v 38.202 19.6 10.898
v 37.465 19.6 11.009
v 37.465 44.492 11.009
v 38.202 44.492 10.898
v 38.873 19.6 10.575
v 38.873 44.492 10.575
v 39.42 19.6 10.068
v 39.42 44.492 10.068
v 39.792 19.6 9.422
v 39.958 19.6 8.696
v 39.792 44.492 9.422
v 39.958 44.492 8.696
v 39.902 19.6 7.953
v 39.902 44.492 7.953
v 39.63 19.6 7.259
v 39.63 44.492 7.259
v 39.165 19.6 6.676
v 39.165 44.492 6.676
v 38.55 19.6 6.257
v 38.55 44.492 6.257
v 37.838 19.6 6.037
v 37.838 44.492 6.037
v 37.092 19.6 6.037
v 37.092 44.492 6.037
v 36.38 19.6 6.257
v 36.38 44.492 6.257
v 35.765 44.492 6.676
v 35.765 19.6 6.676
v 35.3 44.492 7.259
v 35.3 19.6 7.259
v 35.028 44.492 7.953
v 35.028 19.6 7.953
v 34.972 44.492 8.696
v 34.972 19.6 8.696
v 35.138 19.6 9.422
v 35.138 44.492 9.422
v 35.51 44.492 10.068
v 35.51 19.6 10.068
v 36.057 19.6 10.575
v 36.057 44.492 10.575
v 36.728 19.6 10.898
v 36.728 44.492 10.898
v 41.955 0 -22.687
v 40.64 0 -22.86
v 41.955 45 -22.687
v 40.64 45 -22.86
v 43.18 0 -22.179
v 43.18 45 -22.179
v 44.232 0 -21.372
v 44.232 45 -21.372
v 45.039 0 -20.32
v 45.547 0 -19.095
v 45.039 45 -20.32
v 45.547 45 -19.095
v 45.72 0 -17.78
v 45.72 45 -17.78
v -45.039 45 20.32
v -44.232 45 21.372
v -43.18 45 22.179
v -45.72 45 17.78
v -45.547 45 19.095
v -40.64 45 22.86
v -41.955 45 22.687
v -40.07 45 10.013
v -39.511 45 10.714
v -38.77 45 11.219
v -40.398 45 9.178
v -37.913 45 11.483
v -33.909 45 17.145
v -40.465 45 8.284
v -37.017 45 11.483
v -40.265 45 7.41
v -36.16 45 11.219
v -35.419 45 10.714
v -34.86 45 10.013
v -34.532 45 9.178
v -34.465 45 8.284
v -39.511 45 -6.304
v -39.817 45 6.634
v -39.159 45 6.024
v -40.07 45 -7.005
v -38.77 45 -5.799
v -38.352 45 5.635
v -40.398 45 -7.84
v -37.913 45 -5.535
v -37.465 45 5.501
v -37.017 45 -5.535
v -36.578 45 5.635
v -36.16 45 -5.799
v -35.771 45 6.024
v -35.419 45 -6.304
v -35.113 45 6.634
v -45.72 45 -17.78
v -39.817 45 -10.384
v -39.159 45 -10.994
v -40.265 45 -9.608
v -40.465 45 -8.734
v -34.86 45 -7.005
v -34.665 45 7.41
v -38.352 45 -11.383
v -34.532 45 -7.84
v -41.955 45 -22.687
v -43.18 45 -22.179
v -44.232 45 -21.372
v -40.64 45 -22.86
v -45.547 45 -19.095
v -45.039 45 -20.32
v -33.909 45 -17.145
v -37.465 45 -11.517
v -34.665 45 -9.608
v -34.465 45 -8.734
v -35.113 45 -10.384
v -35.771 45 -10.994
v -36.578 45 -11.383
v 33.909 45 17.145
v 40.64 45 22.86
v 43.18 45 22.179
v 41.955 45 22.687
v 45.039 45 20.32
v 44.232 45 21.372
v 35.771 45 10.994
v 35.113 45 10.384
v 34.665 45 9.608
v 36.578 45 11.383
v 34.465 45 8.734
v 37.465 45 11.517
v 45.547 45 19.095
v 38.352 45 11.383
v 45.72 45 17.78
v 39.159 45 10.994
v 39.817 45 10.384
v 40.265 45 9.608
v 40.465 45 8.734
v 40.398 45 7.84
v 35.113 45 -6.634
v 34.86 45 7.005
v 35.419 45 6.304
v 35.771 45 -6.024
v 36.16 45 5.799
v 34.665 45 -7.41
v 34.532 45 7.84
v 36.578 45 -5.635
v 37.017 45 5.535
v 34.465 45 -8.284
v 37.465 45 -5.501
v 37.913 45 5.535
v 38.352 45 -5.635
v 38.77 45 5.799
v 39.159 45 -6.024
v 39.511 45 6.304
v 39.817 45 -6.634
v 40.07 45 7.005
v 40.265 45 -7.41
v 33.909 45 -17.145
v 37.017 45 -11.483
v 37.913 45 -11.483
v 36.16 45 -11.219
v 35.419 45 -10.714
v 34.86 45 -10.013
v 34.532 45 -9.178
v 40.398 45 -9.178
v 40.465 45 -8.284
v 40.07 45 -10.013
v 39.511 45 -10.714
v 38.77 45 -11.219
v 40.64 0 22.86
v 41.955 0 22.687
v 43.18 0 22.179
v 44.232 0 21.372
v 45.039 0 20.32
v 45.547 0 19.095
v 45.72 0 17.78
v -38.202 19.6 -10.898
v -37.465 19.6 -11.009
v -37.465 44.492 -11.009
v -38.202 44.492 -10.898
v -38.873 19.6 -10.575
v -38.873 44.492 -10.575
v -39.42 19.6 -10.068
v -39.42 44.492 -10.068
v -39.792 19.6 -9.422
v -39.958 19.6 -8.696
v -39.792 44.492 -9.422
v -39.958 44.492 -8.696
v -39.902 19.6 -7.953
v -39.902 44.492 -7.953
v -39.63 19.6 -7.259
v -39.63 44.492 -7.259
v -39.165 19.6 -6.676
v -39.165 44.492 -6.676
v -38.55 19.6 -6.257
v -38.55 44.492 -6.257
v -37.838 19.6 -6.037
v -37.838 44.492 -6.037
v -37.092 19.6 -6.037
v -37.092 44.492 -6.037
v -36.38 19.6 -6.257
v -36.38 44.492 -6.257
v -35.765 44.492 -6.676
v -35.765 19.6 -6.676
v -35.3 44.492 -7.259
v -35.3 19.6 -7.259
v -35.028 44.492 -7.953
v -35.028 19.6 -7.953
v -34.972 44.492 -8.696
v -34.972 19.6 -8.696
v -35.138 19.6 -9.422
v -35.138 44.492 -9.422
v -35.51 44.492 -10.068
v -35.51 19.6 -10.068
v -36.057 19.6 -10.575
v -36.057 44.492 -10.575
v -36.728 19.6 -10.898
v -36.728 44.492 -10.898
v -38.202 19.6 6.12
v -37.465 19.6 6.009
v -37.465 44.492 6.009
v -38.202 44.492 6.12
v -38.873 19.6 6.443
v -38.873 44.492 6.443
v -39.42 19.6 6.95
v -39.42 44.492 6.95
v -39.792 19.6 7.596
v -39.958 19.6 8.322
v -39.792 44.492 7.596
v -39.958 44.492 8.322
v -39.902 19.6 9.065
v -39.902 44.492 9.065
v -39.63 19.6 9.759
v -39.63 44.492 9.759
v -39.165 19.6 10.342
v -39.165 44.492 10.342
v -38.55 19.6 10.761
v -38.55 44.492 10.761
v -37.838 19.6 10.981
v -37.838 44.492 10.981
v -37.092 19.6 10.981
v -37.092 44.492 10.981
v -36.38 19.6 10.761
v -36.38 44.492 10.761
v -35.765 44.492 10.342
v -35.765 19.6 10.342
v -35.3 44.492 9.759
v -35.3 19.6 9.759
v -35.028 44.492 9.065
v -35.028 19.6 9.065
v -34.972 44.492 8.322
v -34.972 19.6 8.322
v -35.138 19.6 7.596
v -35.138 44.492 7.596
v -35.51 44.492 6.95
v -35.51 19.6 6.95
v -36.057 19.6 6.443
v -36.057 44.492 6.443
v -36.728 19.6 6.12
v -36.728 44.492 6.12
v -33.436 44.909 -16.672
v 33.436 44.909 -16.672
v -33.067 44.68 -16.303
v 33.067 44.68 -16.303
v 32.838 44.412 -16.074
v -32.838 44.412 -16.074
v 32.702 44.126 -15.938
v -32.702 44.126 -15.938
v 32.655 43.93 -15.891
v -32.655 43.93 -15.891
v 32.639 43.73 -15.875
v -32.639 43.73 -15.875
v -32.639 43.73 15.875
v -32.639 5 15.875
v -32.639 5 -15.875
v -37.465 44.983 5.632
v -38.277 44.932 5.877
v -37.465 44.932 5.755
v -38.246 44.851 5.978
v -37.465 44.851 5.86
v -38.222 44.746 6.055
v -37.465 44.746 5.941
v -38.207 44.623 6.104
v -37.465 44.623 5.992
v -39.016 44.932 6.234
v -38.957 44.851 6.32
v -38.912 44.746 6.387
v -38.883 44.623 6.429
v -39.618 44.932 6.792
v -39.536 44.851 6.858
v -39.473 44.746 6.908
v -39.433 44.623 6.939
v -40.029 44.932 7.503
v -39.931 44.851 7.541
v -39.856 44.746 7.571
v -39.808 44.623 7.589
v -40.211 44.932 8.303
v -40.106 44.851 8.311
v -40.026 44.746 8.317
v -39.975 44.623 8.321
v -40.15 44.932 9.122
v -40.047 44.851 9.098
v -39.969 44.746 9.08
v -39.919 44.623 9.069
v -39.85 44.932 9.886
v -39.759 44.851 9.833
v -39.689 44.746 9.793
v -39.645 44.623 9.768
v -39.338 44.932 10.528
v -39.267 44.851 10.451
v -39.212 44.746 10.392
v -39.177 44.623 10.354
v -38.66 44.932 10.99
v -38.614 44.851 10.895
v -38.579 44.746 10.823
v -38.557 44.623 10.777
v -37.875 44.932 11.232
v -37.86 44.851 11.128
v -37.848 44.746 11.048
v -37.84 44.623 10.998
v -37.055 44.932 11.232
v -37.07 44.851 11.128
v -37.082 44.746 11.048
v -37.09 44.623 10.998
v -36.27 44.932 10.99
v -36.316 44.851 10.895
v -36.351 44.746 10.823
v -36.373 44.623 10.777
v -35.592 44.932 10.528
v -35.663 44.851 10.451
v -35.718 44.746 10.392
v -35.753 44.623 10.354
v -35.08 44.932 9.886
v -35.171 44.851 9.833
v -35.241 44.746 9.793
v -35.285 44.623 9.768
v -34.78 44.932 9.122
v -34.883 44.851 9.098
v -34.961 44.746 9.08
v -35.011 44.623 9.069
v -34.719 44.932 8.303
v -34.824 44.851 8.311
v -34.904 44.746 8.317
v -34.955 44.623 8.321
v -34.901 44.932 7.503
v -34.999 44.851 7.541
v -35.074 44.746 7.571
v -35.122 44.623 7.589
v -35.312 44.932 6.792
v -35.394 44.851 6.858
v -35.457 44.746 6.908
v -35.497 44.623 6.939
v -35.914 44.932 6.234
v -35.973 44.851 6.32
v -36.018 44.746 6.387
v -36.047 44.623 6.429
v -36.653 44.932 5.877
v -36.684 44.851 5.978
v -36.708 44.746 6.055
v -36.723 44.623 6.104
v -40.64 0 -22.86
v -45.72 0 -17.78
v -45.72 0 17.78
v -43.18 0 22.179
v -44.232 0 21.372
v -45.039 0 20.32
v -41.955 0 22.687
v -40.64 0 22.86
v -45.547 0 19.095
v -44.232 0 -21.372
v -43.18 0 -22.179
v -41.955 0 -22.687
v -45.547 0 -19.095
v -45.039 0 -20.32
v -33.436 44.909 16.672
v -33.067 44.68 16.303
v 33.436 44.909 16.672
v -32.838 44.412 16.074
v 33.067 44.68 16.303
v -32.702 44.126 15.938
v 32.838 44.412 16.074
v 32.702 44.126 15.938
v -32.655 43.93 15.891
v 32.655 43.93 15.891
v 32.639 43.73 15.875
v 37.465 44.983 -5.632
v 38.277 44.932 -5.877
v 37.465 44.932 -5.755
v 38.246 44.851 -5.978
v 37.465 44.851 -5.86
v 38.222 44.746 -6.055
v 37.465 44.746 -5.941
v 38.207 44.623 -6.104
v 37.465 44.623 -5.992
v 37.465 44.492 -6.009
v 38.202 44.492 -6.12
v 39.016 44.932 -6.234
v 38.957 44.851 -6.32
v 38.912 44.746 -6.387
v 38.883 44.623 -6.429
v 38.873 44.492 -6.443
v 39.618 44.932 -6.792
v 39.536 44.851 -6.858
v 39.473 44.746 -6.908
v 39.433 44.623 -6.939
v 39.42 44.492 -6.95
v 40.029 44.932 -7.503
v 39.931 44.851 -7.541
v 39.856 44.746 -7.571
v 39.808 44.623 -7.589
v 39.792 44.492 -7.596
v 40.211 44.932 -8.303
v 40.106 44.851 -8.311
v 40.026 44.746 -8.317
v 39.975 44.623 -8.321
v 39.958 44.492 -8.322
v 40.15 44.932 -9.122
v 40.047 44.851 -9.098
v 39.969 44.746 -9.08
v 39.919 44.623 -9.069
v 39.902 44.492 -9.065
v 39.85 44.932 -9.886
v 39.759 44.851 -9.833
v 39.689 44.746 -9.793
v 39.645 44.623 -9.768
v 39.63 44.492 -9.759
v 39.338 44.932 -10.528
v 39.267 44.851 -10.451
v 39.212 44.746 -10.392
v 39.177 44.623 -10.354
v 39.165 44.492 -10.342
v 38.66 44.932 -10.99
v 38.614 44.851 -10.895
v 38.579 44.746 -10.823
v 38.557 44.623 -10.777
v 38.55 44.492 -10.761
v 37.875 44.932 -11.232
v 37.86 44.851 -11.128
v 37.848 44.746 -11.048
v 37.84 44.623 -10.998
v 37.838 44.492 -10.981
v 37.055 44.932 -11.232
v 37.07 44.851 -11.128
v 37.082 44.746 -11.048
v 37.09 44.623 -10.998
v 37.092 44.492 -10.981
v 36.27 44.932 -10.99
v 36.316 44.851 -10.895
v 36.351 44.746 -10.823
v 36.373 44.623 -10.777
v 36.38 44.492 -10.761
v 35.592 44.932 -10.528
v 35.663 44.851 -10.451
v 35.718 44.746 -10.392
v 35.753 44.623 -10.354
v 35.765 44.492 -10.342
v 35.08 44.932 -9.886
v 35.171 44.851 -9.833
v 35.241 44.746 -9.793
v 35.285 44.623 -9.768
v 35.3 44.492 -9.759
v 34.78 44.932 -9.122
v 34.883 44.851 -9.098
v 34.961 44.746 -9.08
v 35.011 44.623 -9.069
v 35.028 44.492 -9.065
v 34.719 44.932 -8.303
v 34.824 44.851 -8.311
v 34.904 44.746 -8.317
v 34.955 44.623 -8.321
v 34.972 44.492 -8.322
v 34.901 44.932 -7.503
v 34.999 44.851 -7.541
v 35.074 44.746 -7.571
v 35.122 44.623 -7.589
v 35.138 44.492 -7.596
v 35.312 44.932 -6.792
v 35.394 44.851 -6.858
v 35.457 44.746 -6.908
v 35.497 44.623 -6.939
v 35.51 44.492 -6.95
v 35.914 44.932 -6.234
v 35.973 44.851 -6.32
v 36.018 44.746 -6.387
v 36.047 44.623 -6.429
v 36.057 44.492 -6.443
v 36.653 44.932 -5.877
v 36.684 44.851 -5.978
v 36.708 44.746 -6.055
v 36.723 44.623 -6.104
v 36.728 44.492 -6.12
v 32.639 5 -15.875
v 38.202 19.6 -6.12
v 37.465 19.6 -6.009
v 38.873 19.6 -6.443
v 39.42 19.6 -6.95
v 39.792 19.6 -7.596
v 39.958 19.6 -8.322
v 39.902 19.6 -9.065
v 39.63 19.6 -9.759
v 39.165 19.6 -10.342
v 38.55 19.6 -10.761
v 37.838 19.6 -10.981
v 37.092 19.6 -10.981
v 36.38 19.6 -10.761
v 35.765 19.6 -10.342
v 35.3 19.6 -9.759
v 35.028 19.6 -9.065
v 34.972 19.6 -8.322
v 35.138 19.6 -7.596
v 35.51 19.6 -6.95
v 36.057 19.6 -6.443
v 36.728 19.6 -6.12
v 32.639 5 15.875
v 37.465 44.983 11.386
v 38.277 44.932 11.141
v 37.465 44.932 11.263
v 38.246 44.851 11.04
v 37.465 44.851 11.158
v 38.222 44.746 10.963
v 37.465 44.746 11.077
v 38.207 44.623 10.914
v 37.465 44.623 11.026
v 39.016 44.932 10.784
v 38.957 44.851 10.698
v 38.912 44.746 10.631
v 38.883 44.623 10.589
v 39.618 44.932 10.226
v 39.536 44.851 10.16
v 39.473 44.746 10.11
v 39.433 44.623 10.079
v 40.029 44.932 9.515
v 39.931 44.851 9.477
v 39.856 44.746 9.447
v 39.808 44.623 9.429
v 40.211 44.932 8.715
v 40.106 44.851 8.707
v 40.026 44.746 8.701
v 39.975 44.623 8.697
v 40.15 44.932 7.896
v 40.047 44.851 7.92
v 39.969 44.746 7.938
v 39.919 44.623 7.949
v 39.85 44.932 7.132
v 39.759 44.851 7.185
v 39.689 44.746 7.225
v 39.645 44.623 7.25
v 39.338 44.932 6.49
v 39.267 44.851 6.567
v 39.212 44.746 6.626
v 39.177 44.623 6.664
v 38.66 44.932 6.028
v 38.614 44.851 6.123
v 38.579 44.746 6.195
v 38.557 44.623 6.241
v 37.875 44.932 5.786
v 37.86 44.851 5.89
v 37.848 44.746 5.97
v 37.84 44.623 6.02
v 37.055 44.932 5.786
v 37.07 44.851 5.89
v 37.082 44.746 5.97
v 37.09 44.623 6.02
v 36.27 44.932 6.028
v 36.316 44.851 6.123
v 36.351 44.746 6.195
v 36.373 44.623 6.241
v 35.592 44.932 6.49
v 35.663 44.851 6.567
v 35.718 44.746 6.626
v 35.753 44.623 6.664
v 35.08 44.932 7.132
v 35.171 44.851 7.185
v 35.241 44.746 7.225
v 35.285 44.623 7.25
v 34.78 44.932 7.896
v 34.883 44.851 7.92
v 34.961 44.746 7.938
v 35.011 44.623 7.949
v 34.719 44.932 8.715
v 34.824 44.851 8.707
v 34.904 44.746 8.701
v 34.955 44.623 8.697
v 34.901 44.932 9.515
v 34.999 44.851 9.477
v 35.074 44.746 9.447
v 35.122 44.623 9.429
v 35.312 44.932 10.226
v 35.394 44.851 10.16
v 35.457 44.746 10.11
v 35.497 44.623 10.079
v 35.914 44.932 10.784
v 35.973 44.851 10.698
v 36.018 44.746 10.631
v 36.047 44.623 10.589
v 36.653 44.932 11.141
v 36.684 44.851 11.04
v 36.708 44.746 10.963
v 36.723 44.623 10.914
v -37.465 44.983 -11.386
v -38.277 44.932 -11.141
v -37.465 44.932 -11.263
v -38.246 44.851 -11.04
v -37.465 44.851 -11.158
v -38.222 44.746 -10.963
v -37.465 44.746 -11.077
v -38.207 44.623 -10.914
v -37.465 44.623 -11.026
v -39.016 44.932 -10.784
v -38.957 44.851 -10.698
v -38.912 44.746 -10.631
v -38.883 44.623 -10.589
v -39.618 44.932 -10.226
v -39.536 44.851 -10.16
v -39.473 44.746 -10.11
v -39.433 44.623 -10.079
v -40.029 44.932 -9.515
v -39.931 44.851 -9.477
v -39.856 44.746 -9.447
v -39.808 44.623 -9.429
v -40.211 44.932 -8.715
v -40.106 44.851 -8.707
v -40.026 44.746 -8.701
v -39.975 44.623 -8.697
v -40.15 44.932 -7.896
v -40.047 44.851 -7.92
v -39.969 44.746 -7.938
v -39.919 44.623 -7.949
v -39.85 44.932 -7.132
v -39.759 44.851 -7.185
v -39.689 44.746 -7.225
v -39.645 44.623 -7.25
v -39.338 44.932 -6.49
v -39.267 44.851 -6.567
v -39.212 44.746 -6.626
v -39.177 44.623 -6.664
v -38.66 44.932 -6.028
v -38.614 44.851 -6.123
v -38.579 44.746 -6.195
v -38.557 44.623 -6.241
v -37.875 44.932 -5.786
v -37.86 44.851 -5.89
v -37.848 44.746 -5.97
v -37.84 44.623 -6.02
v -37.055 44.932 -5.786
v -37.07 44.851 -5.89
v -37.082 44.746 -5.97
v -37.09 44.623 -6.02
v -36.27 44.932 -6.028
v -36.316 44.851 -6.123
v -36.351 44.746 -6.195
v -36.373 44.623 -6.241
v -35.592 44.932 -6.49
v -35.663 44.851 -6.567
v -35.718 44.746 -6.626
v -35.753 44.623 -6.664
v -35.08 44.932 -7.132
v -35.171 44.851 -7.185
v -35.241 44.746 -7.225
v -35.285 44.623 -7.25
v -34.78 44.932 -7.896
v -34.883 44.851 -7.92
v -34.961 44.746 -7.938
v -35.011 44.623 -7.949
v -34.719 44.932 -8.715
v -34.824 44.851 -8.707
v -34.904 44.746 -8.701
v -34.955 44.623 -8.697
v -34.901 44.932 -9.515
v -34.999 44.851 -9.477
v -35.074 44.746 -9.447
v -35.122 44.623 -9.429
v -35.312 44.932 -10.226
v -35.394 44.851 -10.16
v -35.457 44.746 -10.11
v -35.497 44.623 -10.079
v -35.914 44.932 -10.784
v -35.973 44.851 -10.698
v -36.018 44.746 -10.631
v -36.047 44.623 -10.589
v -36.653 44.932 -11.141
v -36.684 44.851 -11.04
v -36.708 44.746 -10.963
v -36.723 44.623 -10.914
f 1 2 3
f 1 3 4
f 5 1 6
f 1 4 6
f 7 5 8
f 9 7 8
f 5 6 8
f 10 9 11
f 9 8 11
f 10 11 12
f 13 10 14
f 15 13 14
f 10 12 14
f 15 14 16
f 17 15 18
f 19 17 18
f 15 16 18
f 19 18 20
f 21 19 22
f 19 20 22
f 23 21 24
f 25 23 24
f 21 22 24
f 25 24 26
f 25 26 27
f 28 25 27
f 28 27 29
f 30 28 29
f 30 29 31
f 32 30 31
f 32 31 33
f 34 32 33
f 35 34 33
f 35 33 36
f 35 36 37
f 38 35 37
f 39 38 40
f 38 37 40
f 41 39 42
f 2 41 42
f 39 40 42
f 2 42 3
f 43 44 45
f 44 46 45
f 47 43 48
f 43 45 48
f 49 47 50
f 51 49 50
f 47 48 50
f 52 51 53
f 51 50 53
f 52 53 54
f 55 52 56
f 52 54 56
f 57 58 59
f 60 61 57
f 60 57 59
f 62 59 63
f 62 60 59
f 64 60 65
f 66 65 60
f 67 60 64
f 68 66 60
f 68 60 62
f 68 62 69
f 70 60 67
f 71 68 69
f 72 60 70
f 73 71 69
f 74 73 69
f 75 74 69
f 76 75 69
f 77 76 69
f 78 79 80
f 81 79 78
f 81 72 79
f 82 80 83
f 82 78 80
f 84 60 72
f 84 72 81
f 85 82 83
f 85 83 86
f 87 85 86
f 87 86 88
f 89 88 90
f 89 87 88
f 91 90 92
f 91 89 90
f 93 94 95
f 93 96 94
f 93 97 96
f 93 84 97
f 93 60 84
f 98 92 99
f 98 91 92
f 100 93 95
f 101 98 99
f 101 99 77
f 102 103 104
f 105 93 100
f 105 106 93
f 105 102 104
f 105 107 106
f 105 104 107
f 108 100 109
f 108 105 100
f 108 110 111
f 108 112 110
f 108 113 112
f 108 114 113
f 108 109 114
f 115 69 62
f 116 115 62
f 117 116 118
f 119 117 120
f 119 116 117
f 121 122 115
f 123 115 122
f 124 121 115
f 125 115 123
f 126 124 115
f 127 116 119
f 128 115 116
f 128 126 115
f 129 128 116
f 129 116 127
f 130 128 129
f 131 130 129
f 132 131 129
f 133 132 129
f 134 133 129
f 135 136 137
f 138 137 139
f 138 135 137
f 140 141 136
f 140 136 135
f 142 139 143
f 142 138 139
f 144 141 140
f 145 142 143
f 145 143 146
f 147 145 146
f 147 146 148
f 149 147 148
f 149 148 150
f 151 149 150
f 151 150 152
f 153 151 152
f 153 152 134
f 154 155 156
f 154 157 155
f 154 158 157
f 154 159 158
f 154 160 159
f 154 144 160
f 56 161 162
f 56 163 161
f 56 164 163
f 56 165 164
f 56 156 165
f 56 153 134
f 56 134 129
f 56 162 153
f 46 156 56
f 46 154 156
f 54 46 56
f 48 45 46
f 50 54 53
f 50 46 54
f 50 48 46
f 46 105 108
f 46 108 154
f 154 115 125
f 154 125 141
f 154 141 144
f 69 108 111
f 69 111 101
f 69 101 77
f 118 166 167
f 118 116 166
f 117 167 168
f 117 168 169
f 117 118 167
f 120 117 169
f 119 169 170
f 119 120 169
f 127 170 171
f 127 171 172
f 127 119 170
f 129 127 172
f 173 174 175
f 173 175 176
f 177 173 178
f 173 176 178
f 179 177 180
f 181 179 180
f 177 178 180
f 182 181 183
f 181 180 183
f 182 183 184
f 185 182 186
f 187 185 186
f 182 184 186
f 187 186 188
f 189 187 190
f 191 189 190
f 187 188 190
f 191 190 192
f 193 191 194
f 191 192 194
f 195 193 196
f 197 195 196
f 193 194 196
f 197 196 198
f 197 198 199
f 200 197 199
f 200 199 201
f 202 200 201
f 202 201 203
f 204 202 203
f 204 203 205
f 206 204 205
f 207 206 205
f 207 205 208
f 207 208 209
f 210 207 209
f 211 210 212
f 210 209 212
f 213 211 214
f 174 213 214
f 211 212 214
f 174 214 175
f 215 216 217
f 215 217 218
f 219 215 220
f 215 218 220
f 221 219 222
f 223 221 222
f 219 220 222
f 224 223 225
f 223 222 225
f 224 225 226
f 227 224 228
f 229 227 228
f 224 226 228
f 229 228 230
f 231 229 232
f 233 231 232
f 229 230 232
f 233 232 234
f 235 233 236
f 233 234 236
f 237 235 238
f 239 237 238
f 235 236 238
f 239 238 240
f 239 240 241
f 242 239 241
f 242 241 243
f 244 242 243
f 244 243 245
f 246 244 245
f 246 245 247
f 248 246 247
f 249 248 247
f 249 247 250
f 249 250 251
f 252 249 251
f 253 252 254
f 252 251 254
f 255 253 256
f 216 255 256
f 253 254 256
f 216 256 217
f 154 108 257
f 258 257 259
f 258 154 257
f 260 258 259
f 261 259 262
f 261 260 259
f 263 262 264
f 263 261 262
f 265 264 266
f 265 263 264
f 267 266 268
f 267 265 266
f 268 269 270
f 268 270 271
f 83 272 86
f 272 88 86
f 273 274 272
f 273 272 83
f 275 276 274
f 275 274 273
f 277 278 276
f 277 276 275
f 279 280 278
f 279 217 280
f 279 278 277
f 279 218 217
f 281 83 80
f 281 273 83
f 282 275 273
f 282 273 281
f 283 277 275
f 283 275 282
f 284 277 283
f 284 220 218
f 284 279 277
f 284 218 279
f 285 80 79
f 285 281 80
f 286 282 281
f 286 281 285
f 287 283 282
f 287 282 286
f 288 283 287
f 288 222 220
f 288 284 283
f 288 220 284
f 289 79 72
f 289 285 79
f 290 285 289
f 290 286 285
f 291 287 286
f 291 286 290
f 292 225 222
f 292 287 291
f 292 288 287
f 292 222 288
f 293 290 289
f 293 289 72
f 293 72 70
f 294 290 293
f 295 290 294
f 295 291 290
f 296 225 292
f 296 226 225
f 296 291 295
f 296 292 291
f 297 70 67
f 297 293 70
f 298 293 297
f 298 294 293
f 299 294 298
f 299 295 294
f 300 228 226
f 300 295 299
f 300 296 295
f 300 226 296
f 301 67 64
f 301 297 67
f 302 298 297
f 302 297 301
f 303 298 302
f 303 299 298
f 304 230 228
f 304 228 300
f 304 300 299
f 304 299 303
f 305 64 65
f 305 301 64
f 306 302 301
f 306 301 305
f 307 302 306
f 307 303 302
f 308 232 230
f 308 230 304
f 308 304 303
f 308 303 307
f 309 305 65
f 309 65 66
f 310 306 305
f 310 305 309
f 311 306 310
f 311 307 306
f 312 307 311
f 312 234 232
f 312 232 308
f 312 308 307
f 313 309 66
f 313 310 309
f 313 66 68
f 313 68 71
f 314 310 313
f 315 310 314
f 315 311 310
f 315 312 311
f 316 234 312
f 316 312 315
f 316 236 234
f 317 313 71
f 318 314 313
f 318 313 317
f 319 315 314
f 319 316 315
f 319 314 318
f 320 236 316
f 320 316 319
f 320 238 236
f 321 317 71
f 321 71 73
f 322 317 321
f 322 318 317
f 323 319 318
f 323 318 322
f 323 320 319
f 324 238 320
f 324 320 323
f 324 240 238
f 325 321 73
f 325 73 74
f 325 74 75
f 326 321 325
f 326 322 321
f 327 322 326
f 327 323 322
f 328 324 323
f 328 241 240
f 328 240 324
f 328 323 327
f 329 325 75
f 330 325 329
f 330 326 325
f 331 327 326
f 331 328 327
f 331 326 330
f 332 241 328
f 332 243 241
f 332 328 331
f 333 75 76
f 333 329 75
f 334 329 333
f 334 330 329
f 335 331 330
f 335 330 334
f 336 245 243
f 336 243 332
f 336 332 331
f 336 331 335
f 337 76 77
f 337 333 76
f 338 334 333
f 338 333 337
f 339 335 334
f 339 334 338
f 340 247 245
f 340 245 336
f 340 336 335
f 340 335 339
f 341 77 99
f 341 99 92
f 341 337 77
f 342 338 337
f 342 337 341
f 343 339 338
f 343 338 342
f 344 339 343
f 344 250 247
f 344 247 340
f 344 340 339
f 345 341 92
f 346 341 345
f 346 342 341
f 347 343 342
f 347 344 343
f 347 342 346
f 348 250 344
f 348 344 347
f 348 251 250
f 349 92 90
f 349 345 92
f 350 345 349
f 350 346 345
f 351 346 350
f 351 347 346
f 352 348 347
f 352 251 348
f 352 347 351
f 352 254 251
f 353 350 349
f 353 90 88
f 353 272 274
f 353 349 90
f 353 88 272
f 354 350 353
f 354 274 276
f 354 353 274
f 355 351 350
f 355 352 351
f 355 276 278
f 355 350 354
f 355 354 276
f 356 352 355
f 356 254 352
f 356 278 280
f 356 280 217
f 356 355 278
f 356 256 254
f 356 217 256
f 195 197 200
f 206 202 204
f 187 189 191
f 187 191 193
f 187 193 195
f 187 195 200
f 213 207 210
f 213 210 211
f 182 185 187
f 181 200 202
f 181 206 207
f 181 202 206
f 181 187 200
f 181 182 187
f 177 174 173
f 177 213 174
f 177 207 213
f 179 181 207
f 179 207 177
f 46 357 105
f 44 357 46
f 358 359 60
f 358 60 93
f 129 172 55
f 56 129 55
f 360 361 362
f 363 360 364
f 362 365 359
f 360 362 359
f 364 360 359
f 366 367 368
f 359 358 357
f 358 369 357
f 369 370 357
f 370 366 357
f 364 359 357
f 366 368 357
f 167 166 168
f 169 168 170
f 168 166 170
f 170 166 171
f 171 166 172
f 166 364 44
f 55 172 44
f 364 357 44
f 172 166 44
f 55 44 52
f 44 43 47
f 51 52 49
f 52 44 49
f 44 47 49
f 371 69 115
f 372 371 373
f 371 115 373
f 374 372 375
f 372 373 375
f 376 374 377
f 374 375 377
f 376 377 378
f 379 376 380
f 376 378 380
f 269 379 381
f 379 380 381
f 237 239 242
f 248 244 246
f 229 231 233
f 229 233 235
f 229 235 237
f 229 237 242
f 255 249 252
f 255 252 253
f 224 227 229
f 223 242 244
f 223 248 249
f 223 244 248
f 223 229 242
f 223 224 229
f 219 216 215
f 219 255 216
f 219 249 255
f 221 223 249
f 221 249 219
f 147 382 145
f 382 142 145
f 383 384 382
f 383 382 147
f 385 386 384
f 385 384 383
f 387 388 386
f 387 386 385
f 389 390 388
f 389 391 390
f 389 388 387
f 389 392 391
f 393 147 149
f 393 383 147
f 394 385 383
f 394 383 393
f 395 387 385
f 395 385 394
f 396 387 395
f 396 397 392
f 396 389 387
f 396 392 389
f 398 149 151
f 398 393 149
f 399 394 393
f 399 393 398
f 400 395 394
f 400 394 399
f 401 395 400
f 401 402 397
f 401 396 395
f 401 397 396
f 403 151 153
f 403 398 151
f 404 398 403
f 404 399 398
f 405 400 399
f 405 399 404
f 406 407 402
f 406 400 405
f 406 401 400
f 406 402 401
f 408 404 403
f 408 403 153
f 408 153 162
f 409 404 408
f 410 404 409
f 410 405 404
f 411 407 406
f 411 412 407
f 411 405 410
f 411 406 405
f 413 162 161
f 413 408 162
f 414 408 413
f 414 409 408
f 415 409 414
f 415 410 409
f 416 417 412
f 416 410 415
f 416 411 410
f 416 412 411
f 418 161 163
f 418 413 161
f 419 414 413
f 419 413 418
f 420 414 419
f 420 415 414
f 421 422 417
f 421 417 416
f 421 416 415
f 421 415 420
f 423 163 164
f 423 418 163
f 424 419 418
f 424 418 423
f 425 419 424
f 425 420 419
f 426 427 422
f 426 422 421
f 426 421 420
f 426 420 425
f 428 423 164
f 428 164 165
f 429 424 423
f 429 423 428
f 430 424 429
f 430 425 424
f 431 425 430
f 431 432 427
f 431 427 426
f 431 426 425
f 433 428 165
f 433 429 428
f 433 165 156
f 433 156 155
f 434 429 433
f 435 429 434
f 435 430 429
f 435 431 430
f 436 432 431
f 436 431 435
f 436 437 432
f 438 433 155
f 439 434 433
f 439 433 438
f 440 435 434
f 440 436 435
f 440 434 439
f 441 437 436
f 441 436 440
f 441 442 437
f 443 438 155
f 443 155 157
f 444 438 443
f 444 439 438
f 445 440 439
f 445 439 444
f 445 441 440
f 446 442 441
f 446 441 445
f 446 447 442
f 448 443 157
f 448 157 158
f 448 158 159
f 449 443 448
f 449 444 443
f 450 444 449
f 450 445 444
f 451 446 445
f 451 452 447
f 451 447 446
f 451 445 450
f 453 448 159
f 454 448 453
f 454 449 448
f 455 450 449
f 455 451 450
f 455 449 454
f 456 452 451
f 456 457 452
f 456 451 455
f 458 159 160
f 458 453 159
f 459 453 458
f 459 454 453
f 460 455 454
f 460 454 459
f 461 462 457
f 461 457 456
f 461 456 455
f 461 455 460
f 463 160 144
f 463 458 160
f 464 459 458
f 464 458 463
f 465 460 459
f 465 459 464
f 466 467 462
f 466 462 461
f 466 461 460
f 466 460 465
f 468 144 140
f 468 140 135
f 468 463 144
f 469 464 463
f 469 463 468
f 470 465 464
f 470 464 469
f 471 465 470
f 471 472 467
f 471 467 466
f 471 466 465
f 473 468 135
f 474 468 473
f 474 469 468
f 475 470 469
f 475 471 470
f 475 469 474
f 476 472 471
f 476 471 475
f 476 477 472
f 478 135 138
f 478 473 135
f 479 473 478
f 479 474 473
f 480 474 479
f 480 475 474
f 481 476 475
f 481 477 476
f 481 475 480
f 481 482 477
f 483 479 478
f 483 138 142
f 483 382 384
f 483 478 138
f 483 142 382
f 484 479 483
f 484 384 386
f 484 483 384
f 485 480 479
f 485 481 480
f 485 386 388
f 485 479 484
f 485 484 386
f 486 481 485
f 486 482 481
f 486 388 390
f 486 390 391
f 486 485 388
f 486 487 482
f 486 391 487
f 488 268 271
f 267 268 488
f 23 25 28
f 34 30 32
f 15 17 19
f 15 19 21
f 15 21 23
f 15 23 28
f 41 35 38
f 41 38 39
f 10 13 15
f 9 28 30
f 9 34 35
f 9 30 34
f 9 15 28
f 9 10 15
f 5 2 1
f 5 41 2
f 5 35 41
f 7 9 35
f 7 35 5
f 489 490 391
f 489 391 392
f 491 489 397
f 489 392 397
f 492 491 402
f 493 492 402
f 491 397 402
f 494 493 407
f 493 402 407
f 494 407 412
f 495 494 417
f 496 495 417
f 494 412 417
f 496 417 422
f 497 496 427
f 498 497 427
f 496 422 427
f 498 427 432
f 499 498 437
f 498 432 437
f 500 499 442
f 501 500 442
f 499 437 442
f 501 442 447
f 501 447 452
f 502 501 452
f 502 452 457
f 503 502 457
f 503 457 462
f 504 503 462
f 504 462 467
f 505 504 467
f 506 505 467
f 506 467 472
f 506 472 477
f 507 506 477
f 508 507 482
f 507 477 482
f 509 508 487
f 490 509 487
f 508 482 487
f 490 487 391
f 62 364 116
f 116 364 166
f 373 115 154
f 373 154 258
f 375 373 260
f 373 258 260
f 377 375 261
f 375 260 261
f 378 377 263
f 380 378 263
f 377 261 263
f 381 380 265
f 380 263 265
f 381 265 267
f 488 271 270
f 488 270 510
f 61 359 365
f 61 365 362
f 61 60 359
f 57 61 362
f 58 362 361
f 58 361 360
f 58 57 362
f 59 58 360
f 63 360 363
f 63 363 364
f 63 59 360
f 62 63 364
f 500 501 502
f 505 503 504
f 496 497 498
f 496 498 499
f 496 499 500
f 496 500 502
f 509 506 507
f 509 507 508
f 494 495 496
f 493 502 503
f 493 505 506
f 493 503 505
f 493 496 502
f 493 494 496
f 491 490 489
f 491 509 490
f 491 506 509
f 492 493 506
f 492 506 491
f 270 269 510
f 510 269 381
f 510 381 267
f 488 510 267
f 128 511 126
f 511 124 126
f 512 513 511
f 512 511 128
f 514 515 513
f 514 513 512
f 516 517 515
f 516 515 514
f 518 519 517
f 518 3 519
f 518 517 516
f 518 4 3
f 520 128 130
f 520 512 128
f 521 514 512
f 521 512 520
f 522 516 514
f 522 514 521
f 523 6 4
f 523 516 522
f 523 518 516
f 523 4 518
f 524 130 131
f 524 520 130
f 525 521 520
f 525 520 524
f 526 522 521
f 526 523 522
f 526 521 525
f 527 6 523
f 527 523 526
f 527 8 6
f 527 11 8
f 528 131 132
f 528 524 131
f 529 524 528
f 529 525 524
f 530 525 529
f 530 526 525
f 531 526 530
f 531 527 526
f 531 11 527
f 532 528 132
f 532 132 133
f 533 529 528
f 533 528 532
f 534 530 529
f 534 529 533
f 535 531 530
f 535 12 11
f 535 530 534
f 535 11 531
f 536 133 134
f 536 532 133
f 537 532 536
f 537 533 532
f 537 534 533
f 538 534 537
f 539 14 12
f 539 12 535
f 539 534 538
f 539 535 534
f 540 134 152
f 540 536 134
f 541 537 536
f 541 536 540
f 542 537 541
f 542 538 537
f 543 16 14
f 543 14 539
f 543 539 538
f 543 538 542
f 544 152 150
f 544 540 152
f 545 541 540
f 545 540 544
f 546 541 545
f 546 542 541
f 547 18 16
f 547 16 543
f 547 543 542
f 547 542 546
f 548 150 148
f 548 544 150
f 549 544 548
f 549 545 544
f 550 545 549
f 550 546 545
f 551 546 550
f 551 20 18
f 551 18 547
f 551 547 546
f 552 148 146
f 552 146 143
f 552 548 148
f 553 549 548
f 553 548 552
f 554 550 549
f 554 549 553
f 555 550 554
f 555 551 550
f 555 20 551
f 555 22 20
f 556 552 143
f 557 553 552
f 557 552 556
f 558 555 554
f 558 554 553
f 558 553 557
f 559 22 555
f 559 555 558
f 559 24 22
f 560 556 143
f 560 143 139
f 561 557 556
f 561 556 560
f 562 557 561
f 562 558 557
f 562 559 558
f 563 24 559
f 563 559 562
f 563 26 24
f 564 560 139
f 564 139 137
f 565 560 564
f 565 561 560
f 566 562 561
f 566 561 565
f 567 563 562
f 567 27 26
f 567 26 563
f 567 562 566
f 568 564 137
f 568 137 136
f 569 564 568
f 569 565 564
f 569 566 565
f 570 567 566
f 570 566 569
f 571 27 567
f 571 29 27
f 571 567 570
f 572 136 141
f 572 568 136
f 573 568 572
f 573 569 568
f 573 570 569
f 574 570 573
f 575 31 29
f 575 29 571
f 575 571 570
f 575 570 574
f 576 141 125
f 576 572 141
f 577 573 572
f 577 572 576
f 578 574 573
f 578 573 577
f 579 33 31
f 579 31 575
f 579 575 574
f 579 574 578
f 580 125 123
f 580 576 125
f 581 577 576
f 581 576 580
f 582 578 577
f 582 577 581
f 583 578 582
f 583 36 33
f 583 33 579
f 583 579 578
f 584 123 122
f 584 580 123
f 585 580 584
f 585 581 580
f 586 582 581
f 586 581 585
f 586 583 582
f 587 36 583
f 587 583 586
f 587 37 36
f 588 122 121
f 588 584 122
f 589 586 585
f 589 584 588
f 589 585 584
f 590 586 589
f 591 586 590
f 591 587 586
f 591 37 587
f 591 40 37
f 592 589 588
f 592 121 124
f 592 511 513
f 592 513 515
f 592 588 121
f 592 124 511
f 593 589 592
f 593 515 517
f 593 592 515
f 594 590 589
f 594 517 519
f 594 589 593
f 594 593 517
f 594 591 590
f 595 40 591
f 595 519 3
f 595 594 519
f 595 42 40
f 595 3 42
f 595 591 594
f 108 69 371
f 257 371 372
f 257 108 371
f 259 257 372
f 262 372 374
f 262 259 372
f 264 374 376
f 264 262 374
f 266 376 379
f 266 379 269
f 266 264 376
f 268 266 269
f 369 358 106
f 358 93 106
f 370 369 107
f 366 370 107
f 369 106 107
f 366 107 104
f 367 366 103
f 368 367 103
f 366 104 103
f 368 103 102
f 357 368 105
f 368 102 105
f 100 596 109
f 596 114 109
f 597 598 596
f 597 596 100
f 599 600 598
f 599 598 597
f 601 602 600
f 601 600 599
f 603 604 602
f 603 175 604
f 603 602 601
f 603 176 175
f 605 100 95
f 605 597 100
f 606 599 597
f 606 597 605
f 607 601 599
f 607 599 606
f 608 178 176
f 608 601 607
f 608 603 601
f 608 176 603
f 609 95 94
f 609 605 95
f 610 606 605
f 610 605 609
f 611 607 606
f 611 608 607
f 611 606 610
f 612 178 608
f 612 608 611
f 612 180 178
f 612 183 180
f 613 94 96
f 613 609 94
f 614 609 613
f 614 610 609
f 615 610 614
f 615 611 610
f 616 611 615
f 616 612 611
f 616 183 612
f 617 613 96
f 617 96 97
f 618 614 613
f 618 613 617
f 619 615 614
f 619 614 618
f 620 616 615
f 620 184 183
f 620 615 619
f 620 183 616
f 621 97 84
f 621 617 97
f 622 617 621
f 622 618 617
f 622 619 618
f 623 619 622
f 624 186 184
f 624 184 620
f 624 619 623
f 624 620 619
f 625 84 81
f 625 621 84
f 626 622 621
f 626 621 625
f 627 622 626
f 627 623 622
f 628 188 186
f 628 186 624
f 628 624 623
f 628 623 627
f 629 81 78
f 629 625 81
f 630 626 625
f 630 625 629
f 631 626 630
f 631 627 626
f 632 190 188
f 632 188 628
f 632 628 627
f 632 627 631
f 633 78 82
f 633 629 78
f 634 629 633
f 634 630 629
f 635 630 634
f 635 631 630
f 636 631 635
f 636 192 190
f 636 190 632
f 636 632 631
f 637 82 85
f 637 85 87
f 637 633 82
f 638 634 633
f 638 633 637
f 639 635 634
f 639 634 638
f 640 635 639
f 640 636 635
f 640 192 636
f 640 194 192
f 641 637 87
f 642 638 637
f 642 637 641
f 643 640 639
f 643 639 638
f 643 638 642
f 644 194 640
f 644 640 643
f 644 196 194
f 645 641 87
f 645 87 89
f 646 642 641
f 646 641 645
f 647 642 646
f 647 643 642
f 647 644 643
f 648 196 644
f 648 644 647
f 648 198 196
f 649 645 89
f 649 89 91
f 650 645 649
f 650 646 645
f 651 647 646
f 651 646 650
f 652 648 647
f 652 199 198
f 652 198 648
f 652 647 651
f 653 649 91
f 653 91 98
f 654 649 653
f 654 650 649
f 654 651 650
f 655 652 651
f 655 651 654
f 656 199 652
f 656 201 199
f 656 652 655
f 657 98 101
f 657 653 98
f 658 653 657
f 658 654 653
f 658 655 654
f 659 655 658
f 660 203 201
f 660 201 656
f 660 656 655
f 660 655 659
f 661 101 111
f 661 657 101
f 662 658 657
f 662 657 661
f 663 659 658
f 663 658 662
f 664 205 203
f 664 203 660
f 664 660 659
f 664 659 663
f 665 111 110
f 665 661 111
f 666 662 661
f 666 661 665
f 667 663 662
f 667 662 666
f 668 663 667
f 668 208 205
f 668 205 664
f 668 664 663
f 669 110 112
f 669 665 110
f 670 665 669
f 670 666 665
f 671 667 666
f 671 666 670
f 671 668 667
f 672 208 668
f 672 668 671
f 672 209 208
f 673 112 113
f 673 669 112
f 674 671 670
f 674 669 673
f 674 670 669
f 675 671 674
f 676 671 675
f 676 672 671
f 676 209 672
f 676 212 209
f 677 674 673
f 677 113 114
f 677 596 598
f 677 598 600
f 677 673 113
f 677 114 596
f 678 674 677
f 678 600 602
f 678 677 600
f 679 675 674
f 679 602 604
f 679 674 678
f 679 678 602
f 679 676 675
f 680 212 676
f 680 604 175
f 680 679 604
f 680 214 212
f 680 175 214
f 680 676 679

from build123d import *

# Parameters (mm, degrees)
SKETCH1_W           = 91.44
SKETCH1_H           = 45.72
BOSS_EXTRUDE1_DEPTH = 45
SKETCH2_W           = 65.278
SKETCH2_H           = 31.75
CUT_EXTRUDE1_DEPTH  = 40
SKETCH3_R           = 2.5
CUT_EXTRUDE2_DEPTH  = 25.4
FILLET1_R           = 5.08
FILLET3_R           = 1.27
FILLET4_R           = 0.508


with BuildPart() as part:
    # Sketch1 → Boss-Extrude1 (new body)
    with BuildSketch(Plane(origin=(0, 0, 0), x_dir=(1, 0, 0), z_dir=(0, 1, 0))):
        Rectangle(SKETCH1_W, SKETCH1_H)
    extrude(amount=BOSS_EXTRUDE1_DEPTH)

    # Sketch2 → Cut-Extrude1 (cut)
    with BuildSketch(Plane(origin=(0, 45, 0), x_dir=(1, 0, 0), z_dir=(0, 1, 0))):
        Rectangle(SKETCH2_W, SKETCH2_H)
    extrude(amount=-CUT_EXTRUDE1_DEPTH, mode=Mode.SUBTRACT)

    # Sketch3 → Cut-Extrude2 (cut)
    with BuildSketch(Plane(origin=(0, 45, 0), x_dir=(1, 0, 0), z_dir=(0, 1, 0))):
        with Locations(Location((37.465, 8.509, 0), (0, 0, 270))):
            Circle(SKETCH3_R)
        with Locations(Location((37.465, -8.509, 0), (0, 0, 270))):
            Circle(SKETCH3_R)
        with Locations(Location((-37.465, -8.509, 0), (0, 0, 90))):
            Circle(SKETCH3_R)
        with Locations(Location((-37.465, 8.509, 0), (0, 0, 90))):
            Circle(SKETCH3_R)
    extrude(amount=-CUT_EXTRUDE2_DEPTH, mode=Mode.SUBTRACT)

    # Fillet1
    fillet1_edges = [part.edges().sort_by_distance(p)[0] for p in [
        (45.72, 22.5, 22.86),
        (-45.72, 22.5, 22.86),
        (-45.72, 22.5, -22.86),
        (45.72, 22.5, -22.86),
    ]]
    fillet(fillet1_edges, radius=FILLET1_R)

    # Fillet3
    fillet3_edges = [part.edges().sort_by_distance(p)[0] for p in [
        (32.639, 45, 0),
        (0, 45, -15.875),
        (-32.639, 45, 0),
        (0, 45, 15.875),
    ]]
    fillet(fillet3_edges, radius=FILLET3_R)

    # Fillet4
    fillet4_edges = [part.edges().sort_by_distance(p)[0] for p in [
        (-37.465, 45, -6.009),
        (-37.465, 45, 11.009),
        (37.465, 45, 6.009),
        (37.465, 45, -11.009),
    ]]
    fillet(fillet4_edges, radius=FILLET4_R)


solid = part.part
